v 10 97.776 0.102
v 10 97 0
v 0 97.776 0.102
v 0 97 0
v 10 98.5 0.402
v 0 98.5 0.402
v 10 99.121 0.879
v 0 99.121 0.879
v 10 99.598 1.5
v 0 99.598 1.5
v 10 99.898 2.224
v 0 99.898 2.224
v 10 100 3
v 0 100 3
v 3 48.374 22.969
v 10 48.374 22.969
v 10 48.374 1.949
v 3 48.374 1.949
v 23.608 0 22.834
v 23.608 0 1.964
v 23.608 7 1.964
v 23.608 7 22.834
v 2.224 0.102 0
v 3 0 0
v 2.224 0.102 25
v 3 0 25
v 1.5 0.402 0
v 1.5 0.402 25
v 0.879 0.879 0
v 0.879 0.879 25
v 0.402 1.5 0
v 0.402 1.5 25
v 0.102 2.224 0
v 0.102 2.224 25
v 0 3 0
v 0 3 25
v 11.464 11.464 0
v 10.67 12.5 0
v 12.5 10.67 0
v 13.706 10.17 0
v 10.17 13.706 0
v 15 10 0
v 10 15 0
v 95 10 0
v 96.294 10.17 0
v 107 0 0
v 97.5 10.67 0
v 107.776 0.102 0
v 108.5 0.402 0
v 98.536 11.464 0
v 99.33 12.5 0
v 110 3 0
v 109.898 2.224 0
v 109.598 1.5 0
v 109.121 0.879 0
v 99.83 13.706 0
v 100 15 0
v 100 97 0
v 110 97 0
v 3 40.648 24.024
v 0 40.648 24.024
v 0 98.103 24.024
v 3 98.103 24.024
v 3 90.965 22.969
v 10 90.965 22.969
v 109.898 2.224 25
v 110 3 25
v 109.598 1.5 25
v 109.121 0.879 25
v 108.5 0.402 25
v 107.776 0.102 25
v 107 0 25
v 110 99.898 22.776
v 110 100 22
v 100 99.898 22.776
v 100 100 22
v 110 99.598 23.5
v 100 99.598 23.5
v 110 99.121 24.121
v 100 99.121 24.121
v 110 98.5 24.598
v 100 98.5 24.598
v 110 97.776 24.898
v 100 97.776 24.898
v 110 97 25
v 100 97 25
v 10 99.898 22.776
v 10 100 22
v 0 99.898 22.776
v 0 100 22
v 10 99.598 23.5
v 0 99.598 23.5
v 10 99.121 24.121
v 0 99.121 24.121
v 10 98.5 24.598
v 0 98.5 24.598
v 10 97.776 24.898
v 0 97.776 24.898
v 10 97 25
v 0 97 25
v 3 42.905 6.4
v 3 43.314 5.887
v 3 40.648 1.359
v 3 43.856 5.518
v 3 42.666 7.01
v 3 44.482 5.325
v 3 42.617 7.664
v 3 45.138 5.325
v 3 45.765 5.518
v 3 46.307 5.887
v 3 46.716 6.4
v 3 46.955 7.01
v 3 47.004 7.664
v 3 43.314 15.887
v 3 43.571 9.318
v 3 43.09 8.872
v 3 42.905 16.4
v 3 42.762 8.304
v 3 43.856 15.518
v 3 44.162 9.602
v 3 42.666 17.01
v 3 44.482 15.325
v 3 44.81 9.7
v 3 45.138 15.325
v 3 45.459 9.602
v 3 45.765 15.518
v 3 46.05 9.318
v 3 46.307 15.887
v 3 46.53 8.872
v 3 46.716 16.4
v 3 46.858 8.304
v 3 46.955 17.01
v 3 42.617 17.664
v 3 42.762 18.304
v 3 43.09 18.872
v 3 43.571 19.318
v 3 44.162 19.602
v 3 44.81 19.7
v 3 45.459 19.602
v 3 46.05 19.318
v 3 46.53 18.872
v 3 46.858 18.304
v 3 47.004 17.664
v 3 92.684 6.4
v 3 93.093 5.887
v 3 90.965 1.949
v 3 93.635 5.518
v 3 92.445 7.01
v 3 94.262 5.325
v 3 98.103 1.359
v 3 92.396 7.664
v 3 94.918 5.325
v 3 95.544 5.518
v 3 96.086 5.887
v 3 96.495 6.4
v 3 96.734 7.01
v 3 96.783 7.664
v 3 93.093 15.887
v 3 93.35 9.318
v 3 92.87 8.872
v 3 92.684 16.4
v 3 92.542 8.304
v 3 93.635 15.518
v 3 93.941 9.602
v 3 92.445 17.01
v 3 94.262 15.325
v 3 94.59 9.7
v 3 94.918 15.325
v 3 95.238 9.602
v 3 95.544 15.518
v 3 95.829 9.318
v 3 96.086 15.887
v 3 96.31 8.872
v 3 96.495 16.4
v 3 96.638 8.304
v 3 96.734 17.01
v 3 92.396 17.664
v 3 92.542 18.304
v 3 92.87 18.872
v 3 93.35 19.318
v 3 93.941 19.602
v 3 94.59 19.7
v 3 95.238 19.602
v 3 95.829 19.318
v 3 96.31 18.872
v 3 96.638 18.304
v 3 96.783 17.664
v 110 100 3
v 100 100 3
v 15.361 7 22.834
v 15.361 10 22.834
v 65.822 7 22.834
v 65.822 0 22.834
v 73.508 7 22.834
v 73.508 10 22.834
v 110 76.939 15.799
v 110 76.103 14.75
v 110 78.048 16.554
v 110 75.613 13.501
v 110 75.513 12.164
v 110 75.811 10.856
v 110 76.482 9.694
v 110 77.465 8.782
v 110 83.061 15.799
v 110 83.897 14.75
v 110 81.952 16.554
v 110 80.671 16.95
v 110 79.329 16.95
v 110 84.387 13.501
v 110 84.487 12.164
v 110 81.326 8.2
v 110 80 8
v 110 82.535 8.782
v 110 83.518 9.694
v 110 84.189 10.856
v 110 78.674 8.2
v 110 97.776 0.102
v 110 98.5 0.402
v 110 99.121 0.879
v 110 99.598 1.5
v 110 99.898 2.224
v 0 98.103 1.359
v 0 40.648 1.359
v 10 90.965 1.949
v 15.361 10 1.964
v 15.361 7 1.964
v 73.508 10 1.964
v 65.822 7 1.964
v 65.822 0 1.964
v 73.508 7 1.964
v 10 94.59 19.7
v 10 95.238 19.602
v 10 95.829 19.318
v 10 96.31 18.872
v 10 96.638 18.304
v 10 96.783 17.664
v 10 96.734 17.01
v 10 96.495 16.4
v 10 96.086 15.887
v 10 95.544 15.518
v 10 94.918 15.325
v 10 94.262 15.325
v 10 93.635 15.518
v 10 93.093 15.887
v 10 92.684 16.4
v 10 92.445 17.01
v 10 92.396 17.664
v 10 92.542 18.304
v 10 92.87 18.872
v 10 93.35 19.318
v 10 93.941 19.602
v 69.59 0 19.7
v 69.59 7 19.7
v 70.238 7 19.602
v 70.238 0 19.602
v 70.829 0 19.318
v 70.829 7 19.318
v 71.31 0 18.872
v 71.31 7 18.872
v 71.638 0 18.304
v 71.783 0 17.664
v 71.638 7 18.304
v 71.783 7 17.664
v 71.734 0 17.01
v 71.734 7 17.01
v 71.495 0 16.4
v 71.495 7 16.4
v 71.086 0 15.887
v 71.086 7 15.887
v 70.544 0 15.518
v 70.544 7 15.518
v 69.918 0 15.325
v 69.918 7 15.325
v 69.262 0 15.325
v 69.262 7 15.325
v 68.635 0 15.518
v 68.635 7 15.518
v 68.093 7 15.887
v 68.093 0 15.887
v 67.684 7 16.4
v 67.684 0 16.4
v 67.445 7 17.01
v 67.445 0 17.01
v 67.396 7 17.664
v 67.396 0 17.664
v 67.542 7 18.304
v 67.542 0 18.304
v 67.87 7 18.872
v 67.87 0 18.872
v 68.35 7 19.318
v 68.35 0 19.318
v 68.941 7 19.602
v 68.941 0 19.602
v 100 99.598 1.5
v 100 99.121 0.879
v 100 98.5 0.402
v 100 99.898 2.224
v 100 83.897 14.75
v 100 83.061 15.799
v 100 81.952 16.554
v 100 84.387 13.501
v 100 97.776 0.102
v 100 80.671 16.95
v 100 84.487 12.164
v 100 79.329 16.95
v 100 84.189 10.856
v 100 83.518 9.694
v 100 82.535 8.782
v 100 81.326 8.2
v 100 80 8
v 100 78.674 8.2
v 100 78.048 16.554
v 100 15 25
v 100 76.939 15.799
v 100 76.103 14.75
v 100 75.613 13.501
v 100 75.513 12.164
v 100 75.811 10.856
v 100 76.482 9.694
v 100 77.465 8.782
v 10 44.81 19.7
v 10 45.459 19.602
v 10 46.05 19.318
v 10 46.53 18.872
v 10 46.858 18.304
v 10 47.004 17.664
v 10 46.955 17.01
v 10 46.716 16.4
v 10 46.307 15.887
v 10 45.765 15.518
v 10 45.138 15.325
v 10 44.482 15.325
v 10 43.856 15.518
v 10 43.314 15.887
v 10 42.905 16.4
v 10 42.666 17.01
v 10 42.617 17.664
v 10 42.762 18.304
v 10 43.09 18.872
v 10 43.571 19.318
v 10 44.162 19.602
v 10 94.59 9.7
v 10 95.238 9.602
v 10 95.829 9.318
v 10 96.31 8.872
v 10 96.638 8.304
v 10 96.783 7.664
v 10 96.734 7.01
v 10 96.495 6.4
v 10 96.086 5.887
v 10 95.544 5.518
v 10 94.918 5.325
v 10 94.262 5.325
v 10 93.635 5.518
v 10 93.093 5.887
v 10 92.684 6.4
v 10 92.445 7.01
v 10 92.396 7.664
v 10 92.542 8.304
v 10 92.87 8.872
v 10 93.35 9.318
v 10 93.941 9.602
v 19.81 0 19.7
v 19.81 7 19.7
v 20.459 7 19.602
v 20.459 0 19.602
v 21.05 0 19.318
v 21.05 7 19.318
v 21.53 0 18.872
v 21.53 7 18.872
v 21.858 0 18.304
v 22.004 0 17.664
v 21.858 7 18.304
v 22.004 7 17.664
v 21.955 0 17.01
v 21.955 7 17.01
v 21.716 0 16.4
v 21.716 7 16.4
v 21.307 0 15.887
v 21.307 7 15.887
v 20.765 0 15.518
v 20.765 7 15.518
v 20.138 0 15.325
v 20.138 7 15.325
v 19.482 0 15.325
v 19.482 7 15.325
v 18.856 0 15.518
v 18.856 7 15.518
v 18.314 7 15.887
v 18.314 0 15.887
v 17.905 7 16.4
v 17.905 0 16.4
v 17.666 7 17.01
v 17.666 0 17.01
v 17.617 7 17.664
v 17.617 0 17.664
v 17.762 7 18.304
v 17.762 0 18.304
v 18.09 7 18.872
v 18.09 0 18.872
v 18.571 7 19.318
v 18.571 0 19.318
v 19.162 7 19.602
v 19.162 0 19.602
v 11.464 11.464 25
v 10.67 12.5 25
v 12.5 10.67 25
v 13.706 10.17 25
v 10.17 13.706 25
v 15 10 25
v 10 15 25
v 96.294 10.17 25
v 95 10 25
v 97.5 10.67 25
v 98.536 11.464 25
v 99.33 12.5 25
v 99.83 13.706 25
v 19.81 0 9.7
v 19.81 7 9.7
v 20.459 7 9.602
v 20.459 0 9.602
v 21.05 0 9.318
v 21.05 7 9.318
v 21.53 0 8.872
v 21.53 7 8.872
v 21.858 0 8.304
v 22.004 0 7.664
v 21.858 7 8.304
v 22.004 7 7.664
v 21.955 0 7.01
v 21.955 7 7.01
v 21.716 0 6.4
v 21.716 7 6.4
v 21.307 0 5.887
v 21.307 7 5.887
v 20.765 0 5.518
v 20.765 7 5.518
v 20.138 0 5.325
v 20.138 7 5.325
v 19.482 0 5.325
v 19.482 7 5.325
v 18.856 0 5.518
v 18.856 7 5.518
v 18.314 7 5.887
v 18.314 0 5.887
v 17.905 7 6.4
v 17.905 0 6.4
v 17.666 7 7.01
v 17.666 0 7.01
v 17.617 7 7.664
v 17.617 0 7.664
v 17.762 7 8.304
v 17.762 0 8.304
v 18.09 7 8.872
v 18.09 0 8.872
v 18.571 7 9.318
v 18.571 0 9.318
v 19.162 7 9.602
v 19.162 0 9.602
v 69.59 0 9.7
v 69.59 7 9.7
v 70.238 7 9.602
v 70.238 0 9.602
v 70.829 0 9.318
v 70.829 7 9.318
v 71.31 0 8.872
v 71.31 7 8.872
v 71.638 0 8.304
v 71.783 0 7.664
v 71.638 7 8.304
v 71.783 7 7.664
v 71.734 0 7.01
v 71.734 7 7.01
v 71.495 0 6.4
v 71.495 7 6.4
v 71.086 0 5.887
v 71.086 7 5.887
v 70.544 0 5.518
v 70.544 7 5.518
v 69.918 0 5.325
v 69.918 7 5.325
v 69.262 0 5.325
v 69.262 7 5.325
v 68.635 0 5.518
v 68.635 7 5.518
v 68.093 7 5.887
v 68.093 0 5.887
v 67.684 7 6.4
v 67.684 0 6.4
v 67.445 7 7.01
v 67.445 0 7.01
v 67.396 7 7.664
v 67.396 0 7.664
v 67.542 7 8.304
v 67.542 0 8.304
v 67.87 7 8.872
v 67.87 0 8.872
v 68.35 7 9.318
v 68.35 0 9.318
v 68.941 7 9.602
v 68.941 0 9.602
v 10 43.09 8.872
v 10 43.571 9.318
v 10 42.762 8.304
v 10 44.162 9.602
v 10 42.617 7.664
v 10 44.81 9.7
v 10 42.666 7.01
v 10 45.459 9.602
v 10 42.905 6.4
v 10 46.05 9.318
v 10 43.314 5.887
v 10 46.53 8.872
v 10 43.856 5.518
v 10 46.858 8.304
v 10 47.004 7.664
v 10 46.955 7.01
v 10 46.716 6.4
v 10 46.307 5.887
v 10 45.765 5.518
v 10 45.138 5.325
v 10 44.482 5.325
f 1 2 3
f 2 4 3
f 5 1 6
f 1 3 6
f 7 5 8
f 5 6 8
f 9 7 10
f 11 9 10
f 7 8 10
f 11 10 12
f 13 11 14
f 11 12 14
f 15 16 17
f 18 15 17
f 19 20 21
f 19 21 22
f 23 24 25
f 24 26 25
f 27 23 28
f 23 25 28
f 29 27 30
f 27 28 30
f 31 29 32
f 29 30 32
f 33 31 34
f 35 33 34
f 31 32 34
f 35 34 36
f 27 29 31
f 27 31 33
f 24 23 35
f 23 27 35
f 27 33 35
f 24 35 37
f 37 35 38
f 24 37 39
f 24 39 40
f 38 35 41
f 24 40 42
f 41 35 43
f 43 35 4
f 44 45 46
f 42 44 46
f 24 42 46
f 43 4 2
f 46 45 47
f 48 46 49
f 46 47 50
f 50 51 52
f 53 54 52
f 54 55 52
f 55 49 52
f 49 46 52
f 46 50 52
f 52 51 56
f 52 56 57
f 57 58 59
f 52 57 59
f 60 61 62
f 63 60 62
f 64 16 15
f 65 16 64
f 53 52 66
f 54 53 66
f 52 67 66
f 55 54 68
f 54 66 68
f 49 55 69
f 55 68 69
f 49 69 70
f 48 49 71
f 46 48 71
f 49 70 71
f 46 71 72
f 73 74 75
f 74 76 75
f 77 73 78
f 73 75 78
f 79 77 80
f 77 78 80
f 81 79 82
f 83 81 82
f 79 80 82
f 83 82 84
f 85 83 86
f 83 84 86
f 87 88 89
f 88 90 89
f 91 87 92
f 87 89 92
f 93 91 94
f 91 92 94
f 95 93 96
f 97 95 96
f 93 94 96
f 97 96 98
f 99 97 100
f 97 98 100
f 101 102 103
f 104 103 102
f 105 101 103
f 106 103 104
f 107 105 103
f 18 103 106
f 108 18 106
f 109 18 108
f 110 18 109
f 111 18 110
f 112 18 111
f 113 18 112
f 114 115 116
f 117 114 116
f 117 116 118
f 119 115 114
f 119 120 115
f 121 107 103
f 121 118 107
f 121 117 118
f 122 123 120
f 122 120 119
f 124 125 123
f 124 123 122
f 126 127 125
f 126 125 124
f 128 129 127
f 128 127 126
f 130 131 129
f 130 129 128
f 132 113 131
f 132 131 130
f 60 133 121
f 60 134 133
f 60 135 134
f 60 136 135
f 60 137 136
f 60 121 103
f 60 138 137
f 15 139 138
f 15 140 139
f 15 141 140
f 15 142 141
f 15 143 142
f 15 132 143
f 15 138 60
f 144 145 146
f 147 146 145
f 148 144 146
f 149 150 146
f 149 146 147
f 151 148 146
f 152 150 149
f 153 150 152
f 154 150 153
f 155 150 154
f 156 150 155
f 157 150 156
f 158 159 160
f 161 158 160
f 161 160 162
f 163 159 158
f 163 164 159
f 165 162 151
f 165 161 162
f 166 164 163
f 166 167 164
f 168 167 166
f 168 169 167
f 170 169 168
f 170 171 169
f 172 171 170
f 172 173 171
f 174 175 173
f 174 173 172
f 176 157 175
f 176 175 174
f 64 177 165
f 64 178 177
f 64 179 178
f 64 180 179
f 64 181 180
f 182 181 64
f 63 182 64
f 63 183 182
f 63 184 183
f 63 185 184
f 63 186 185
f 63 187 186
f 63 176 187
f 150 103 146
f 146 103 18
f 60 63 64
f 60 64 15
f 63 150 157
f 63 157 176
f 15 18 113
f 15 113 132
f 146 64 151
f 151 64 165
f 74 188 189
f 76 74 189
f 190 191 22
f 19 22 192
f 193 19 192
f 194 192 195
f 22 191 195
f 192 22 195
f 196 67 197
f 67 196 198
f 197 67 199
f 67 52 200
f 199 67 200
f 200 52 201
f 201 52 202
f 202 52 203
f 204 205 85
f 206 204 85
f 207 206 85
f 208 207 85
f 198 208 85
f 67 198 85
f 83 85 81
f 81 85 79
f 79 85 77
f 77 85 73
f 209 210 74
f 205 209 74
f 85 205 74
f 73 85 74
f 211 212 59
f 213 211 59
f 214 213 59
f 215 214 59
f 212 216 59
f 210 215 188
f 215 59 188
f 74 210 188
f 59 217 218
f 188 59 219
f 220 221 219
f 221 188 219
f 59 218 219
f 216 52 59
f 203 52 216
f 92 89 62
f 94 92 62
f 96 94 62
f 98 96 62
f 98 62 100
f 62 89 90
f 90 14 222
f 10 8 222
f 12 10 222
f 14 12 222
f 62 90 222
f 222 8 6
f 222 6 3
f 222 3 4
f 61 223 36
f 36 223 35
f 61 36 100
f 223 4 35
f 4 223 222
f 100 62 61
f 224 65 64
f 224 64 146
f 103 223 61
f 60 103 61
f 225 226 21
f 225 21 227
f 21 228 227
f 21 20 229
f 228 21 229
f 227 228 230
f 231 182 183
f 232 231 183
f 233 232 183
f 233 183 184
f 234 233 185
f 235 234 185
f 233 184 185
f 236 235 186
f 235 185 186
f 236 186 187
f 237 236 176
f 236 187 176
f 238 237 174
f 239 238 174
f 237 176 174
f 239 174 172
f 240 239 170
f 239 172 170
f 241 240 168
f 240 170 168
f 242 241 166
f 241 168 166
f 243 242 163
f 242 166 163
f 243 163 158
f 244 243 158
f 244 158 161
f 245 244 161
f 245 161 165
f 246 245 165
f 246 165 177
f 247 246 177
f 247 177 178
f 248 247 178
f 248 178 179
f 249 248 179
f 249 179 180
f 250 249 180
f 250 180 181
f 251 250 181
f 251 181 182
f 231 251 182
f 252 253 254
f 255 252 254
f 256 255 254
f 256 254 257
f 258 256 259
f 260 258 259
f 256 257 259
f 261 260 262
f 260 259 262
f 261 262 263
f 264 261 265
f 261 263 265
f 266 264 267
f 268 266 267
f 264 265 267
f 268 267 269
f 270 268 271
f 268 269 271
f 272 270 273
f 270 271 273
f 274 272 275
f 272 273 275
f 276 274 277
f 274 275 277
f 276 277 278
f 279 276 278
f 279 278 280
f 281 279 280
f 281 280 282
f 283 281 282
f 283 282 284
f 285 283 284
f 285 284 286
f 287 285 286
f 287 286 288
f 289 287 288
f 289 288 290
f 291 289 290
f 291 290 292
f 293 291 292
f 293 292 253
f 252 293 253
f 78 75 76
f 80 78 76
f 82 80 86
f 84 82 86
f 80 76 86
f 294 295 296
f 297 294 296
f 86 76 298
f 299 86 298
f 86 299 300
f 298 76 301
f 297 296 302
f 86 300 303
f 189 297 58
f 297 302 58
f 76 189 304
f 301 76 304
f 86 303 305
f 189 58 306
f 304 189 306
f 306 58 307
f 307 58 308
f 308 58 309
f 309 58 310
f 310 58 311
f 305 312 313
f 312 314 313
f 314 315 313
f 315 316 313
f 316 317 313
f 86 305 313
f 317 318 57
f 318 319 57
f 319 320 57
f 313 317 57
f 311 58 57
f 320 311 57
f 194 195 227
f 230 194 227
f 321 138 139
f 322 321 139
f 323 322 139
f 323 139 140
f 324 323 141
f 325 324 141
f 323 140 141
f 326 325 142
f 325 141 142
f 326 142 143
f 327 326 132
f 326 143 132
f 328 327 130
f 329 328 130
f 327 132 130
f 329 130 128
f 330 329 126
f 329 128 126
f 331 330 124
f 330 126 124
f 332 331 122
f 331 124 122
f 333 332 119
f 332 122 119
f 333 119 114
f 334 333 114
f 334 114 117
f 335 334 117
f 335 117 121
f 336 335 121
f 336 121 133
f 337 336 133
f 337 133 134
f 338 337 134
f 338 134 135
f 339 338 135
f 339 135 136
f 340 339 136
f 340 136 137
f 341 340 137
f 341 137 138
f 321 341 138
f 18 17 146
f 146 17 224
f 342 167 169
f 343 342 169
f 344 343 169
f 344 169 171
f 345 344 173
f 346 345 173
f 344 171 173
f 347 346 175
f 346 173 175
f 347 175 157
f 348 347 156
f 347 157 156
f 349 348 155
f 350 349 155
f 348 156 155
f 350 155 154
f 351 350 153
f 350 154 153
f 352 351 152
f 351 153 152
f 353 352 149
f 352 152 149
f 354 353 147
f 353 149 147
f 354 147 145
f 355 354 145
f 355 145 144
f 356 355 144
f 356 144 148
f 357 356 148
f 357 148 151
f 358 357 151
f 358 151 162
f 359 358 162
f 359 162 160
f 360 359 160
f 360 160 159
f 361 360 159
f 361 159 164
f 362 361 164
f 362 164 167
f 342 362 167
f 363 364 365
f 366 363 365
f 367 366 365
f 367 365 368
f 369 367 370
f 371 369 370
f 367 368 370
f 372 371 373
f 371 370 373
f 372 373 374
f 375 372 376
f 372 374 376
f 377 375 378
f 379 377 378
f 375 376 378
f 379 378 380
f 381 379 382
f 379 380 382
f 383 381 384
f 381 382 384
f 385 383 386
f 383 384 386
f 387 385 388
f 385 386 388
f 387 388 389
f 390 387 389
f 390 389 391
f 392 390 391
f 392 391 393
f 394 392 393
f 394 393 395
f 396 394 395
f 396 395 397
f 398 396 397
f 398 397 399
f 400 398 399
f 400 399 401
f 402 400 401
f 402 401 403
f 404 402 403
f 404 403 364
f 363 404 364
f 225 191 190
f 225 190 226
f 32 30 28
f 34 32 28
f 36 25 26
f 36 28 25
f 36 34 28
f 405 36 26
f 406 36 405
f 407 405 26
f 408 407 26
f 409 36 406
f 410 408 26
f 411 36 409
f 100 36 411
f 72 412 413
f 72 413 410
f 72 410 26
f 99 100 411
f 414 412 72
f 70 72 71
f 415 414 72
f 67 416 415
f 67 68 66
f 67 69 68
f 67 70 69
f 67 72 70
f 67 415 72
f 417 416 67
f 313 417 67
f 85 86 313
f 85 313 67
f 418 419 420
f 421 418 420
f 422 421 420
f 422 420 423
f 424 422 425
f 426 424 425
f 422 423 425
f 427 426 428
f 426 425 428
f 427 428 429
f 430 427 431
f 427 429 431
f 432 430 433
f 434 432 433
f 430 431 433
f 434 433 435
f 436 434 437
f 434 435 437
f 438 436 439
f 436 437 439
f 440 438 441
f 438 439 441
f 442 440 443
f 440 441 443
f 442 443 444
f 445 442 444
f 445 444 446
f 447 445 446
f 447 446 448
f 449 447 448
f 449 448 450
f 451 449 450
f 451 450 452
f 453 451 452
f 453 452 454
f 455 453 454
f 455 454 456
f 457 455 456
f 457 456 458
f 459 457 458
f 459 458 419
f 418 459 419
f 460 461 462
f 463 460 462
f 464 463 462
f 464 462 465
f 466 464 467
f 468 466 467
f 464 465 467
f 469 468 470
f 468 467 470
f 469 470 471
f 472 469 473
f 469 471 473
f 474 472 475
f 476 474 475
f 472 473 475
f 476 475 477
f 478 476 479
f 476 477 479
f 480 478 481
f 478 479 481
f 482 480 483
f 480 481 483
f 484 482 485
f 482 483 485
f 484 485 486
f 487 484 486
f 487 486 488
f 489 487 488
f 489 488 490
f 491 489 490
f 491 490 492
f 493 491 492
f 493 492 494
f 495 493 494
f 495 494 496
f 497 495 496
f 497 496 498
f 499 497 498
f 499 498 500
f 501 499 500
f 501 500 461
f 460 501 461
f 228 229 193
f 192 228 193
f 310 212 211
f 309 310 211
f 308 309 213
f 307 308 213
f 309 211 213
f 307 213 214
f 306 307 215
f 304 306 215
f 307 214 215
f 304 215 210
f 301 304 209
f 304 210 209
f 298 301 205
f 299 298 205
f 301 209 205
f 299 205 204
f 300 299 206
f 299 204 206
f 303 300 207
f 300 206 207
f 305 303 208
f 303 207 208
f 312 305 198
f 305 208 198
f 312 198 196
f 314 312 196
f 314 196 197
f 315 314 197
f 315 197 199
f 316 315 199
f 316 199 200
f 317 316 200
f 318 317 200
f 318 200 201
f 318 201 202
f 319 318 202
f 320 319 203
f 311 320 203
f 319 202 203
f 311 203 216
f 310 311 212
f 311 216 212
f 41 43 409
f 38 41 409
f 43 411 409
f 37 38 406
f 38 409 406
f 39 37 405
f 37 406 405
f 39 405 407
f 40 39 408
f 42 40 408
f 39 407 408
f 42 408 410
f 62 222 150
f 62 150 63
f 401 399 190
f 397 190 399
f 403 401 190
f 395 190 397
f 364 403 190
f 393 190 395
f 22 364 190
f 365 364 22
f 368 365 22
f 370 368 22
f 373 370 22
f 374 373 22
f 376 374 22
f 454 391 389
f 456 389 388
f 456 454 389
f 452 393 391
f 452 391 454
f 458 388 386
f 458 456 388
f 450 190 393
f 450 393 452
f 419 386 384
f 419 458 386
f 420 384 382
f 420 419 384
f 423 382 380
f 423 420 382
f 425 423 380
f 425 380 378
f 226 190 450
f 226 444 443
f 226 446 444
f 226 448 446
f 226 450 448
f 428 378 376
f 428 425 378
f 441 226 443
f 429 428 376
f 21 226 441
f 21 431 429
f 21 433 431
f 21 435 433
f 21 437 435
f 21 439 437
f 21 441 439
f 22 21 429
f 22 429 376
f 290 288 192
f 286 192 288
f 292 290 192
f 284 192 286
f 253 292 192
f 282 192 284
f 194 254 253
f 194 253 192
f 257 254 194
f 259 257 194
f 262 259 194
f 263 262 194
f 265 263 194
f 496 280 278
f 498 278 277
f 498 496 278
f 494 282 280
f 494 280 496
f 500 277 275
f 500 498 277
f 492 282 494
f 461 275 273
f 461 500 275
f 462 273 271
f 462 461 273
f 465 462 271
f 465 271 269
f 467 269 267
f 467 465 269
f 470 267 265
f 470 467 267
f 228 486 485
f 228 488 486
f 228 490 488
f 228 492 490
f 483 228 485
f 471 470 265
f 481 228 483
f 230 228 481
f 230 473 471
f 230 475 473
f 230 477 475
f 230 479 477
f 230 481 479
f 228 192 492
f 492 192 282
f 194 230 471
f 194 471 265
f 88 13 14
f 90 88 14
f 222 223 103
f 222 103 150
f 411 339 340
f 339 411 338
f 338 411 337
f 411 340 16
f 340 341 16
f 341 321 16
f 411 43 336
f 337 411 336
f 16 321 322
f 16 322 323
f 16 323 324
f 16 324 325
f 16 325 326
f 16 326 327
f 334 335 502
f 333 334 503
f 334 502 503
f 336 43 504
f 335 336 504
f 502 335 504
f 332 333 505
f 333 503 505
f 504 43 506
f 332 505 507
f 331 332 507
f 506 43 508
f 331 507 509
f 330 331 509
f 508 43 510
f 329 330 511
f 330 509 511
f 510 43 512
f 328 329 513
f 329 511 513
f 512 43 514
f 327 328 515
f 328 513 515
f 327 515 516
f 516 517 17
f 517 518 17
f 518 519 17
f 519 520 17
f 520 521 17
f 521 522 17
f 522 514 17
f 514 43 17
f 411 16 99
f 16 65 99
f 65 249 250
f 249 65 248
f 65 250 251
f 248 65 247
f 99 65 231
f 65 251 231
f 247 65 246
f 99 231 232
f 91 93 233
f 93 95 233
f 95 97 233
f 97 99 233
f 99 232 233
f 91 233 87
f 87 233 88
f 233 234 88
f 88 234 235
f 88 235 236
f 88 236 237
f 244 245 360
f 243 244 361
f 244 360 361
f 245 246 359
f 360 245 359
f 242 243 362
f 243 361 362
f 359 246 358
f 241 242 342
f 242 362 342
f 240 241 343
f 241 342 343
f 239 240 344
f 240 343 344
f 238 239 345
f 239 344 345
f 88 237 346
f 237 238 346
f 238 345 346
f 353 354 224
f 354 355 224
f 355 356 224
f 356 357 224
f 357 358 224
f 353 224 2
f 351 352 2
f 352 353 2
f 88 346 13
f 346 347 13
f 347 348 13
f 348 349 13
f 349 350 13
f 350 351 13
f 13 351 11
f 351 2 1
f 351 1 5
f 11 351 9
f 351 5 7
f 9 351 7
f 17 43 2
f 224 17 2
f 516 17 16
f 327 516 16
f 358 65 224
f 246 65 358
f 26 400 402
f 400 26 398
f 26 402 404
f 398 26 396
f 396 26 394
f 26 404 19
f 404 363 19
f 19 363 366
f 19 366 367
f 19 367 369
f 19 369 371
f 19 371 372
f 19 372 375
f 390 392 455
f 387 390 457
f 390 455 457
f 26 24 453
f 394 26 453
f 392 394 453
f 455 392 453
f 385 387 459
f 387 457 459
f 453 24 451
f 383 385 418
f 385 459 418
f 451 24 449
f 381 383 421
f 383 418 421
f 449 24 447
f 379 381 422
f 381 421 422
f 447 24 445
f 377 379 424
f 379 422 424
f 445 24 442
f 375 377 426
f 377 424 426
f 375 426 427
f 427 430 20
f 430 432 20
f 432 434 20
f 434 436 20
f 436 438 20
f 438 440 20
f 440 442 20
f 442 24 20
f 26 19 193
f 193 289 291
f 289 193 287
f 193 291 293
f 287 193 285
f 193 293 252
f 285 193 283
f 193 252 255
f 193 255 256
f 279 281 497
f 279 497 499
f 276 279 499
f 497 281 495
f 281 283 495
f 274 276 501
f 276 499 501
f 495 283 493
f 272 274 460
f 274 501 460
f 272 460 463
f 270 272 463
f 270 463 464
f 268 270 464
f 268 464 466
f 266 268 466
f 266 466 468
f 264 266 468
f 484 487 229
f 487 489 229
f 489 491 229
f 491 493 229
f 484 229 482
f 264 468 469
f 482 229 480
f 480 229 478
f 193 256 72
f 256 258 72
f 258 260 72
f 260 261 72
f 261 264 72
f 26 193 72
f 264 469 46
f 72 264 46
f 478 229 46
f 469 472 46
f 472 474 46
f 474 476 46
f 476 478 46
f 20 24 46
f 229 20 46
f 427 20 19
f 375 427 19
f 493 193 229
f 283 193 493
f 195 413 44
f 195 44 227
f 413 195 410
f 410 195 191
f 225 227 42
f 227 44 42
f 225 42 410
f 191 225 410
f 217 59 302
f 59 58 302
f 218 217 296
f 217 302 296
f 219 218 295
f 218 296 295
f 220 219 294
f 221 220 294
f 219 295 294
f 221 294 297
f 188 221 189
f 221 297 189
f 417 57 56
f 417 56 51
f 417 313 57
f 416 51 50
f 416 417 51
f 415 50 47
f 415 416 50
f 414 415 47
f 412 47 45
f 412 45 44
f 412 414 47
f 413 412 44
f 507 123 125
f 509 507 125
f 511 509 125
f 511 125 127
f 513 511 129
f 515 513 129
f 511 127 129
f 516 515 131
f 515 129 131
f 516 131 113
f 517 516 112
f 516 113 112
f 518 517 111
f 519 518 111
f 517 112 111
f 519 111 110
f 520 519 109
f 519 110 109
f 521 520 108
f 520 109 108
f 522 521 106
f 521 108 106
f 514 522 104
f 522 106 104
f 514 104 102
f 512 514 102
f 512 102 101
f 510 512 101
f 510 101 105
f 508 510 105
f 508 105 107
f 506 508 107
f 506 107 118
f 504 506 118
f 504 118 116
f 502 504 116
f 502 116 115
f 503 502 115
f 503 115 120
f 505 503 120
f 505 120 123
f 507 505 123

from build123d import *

# Parameters (mm, degrees)
BOSS_EXTRUDE1_DEPTH = 25
SKETCH2_R           = 2.2
CUT_EXTRUDE1_DEPTH  = 10
SKETCH4_W           = 21.020217786
SKETCH4_H           = 42.591039887
CUT_EXTRUDE2_DEPTH  = 14
SKETCH5_W           = 22.665717921
SKETCH5_H           = 57.45495938
CUT_EXTRUDE3_DEPTH  = 3
FILLET1_R           = 5
FILLET2_R           = 3
SKETCH6_R           = 4.5
CUT_EXTRUDE4_DEPTH  = 10
SKETCH8_W           = 42.21478983
SKETCH8_H           = 20.870122348
CUT_EXTRUDE5_DEPTH  = 21
SKETCH9_W           = 58.147470605
SKETCH9_H           = 20.870122348
CUT_EXTRUDE6_DEPTH  = 3
SKETCH10_R          = 2.2
CUT_EXTRUDE7_DEPTH  = 23


with BuildPart() as part:
    # Sketch1 → Boss-Extrude1 (new body)
    with BuildSketch(Plane.XY):
        Polygon((0, 100), (0, 0), (110, 0), (110, 100), (100, 100), (100, 10), (10, 10), (10, 100), align=None)
    extrude(amount=BOSS_EXTRUDE1_DEPTH)

    # Sketch2 → Cut-Extrude1 (cut)
    with BuildSketch(Plane.ZY):
        with Locations((7.5, 94.589613301)):
            Circle(SKETCH2_R)
        with Locations((17.5, 94.589613301)):
            Circle(SKETCH2_R)
        with Locations((7.5, 44.810386699)):
            Circle(SKETCH2_R)
        with Locations((17.5, 44.810386699)):
            Circle(SKETCH2_R)
    extrude(amount=-CUT_EXTRUDE1_DEPTH, mode=Mode.SUBTRACT)

    # Sketch4 → Cut-Extrude2 (cut)
    with BuildSketch(Plane(origin=(10, 0, 0), x_dir=(0, 0, -1), z_dir=(1, 0, 0))):
        with Locations((-12.458750101, 69.669580668)):
            Rectangle(SKETCH4_W, SKETCH4_H)
    extrude(amount=-CUT_EXTRUDE2_DEPTH, mode=Mode.SUBTRACT)

    # Sketch5 → Cut-Extrude3 (cut)
    with BuildSketch(Plane.ZY):
        with Locations((12.691576382, 69.375131892)):
            Rectangle(SKETCH5_W, SKETCH5_H)
    extrude(amount=-CUT_EXTRUDE3_DEPTH, mode=Mode.SUBTRACT)

    # Fillet1
    fillet1_edges = [part.edges().sort_by_distance(p)[0] for p in [
        (10, 10, 12.5),
        (100, 10, 12.5),
    ]]
    fillet(fillet1_edges, radius=FILLET1_R)

    # Fillet2
    fillet2_edges = [part.edges().sort_by_distance(p)[0] for p in [
        (5, 100, 0),
        (105, 100, 0),
        (110, 0, 12.5),
        (0, 0, 12.5),
        (5, 100, 25),
        (105, 100, 25),
    ]]
    fillet(fillet2_edges, radius=FILLET2_R)

    # Sketch6 → Cut-Extrude4 (cut)
    with BuildSketch(Plane(origin=(110, 0, 0), x_dir=(0, 0, -1), z_dir=(1, 0, 0))):
        with Locations((-12.5, 80)):
            Circle(SKETCH6_R)
    extrude(amount=-CUT_EXTRUDE4_DEPTH, mode=Mode.SUBTRACT)

    # Sketch8 → Cut-Extrude5 (cut)
    with BuildSketch(Plane.XZ):
        with Locations((44.714968541, 12.398762514)):
            Rectangle(SKETCH8_W, SKETCH8_H)
    extrude(amount=-CUT_EXTRUDE5_DEPTH, mode=Mode.SUBTRACT)

    # Sketch9 → Cut-Extrude6 (cut)
    with BuildSketch(Plane(origin=(0, 10, 0), x_dir=(1, 0, 0), z_dir=(0, 1, 0))):
        with Locations((44.434650342, -12.398762514)):
            Rectangle(SKETCH9_W, SKETCH9_H)
    extrude(amount=-CUT_EXTRUDE6_DEPTH, mode=Mode.SUBTRACT)

    # Sketch10 → Cut-Extrude7 (cut)
    with BuildSketch(Plane(origin=(0, 7, 0), x_dir=(1, 0, 0), z_dir=(0, 1, 0))):
        with Locations(Location((69.589613301, -7.5, 0), (0, 0, 270))):
            Circle(SKETCH10_R)
        with Locations(Location((69.589613301, -17.5, 0), (0, 0, 270))):
            Circle(SKETCH10_R)
        with Locations(Location((19.810386699, -7.5, 0), (0, 0, 270))):
            Circle(SKETCH10_R)
        with Locations(Location((19.810386699, -17.5, 0), (0, 0, 270))):
            Circle(SKETCH10_R)
    extrude(amount=-CUT_EXTRUDE7_DEPTH, mode=Mode.SUBTRACT)


solid = part.part
